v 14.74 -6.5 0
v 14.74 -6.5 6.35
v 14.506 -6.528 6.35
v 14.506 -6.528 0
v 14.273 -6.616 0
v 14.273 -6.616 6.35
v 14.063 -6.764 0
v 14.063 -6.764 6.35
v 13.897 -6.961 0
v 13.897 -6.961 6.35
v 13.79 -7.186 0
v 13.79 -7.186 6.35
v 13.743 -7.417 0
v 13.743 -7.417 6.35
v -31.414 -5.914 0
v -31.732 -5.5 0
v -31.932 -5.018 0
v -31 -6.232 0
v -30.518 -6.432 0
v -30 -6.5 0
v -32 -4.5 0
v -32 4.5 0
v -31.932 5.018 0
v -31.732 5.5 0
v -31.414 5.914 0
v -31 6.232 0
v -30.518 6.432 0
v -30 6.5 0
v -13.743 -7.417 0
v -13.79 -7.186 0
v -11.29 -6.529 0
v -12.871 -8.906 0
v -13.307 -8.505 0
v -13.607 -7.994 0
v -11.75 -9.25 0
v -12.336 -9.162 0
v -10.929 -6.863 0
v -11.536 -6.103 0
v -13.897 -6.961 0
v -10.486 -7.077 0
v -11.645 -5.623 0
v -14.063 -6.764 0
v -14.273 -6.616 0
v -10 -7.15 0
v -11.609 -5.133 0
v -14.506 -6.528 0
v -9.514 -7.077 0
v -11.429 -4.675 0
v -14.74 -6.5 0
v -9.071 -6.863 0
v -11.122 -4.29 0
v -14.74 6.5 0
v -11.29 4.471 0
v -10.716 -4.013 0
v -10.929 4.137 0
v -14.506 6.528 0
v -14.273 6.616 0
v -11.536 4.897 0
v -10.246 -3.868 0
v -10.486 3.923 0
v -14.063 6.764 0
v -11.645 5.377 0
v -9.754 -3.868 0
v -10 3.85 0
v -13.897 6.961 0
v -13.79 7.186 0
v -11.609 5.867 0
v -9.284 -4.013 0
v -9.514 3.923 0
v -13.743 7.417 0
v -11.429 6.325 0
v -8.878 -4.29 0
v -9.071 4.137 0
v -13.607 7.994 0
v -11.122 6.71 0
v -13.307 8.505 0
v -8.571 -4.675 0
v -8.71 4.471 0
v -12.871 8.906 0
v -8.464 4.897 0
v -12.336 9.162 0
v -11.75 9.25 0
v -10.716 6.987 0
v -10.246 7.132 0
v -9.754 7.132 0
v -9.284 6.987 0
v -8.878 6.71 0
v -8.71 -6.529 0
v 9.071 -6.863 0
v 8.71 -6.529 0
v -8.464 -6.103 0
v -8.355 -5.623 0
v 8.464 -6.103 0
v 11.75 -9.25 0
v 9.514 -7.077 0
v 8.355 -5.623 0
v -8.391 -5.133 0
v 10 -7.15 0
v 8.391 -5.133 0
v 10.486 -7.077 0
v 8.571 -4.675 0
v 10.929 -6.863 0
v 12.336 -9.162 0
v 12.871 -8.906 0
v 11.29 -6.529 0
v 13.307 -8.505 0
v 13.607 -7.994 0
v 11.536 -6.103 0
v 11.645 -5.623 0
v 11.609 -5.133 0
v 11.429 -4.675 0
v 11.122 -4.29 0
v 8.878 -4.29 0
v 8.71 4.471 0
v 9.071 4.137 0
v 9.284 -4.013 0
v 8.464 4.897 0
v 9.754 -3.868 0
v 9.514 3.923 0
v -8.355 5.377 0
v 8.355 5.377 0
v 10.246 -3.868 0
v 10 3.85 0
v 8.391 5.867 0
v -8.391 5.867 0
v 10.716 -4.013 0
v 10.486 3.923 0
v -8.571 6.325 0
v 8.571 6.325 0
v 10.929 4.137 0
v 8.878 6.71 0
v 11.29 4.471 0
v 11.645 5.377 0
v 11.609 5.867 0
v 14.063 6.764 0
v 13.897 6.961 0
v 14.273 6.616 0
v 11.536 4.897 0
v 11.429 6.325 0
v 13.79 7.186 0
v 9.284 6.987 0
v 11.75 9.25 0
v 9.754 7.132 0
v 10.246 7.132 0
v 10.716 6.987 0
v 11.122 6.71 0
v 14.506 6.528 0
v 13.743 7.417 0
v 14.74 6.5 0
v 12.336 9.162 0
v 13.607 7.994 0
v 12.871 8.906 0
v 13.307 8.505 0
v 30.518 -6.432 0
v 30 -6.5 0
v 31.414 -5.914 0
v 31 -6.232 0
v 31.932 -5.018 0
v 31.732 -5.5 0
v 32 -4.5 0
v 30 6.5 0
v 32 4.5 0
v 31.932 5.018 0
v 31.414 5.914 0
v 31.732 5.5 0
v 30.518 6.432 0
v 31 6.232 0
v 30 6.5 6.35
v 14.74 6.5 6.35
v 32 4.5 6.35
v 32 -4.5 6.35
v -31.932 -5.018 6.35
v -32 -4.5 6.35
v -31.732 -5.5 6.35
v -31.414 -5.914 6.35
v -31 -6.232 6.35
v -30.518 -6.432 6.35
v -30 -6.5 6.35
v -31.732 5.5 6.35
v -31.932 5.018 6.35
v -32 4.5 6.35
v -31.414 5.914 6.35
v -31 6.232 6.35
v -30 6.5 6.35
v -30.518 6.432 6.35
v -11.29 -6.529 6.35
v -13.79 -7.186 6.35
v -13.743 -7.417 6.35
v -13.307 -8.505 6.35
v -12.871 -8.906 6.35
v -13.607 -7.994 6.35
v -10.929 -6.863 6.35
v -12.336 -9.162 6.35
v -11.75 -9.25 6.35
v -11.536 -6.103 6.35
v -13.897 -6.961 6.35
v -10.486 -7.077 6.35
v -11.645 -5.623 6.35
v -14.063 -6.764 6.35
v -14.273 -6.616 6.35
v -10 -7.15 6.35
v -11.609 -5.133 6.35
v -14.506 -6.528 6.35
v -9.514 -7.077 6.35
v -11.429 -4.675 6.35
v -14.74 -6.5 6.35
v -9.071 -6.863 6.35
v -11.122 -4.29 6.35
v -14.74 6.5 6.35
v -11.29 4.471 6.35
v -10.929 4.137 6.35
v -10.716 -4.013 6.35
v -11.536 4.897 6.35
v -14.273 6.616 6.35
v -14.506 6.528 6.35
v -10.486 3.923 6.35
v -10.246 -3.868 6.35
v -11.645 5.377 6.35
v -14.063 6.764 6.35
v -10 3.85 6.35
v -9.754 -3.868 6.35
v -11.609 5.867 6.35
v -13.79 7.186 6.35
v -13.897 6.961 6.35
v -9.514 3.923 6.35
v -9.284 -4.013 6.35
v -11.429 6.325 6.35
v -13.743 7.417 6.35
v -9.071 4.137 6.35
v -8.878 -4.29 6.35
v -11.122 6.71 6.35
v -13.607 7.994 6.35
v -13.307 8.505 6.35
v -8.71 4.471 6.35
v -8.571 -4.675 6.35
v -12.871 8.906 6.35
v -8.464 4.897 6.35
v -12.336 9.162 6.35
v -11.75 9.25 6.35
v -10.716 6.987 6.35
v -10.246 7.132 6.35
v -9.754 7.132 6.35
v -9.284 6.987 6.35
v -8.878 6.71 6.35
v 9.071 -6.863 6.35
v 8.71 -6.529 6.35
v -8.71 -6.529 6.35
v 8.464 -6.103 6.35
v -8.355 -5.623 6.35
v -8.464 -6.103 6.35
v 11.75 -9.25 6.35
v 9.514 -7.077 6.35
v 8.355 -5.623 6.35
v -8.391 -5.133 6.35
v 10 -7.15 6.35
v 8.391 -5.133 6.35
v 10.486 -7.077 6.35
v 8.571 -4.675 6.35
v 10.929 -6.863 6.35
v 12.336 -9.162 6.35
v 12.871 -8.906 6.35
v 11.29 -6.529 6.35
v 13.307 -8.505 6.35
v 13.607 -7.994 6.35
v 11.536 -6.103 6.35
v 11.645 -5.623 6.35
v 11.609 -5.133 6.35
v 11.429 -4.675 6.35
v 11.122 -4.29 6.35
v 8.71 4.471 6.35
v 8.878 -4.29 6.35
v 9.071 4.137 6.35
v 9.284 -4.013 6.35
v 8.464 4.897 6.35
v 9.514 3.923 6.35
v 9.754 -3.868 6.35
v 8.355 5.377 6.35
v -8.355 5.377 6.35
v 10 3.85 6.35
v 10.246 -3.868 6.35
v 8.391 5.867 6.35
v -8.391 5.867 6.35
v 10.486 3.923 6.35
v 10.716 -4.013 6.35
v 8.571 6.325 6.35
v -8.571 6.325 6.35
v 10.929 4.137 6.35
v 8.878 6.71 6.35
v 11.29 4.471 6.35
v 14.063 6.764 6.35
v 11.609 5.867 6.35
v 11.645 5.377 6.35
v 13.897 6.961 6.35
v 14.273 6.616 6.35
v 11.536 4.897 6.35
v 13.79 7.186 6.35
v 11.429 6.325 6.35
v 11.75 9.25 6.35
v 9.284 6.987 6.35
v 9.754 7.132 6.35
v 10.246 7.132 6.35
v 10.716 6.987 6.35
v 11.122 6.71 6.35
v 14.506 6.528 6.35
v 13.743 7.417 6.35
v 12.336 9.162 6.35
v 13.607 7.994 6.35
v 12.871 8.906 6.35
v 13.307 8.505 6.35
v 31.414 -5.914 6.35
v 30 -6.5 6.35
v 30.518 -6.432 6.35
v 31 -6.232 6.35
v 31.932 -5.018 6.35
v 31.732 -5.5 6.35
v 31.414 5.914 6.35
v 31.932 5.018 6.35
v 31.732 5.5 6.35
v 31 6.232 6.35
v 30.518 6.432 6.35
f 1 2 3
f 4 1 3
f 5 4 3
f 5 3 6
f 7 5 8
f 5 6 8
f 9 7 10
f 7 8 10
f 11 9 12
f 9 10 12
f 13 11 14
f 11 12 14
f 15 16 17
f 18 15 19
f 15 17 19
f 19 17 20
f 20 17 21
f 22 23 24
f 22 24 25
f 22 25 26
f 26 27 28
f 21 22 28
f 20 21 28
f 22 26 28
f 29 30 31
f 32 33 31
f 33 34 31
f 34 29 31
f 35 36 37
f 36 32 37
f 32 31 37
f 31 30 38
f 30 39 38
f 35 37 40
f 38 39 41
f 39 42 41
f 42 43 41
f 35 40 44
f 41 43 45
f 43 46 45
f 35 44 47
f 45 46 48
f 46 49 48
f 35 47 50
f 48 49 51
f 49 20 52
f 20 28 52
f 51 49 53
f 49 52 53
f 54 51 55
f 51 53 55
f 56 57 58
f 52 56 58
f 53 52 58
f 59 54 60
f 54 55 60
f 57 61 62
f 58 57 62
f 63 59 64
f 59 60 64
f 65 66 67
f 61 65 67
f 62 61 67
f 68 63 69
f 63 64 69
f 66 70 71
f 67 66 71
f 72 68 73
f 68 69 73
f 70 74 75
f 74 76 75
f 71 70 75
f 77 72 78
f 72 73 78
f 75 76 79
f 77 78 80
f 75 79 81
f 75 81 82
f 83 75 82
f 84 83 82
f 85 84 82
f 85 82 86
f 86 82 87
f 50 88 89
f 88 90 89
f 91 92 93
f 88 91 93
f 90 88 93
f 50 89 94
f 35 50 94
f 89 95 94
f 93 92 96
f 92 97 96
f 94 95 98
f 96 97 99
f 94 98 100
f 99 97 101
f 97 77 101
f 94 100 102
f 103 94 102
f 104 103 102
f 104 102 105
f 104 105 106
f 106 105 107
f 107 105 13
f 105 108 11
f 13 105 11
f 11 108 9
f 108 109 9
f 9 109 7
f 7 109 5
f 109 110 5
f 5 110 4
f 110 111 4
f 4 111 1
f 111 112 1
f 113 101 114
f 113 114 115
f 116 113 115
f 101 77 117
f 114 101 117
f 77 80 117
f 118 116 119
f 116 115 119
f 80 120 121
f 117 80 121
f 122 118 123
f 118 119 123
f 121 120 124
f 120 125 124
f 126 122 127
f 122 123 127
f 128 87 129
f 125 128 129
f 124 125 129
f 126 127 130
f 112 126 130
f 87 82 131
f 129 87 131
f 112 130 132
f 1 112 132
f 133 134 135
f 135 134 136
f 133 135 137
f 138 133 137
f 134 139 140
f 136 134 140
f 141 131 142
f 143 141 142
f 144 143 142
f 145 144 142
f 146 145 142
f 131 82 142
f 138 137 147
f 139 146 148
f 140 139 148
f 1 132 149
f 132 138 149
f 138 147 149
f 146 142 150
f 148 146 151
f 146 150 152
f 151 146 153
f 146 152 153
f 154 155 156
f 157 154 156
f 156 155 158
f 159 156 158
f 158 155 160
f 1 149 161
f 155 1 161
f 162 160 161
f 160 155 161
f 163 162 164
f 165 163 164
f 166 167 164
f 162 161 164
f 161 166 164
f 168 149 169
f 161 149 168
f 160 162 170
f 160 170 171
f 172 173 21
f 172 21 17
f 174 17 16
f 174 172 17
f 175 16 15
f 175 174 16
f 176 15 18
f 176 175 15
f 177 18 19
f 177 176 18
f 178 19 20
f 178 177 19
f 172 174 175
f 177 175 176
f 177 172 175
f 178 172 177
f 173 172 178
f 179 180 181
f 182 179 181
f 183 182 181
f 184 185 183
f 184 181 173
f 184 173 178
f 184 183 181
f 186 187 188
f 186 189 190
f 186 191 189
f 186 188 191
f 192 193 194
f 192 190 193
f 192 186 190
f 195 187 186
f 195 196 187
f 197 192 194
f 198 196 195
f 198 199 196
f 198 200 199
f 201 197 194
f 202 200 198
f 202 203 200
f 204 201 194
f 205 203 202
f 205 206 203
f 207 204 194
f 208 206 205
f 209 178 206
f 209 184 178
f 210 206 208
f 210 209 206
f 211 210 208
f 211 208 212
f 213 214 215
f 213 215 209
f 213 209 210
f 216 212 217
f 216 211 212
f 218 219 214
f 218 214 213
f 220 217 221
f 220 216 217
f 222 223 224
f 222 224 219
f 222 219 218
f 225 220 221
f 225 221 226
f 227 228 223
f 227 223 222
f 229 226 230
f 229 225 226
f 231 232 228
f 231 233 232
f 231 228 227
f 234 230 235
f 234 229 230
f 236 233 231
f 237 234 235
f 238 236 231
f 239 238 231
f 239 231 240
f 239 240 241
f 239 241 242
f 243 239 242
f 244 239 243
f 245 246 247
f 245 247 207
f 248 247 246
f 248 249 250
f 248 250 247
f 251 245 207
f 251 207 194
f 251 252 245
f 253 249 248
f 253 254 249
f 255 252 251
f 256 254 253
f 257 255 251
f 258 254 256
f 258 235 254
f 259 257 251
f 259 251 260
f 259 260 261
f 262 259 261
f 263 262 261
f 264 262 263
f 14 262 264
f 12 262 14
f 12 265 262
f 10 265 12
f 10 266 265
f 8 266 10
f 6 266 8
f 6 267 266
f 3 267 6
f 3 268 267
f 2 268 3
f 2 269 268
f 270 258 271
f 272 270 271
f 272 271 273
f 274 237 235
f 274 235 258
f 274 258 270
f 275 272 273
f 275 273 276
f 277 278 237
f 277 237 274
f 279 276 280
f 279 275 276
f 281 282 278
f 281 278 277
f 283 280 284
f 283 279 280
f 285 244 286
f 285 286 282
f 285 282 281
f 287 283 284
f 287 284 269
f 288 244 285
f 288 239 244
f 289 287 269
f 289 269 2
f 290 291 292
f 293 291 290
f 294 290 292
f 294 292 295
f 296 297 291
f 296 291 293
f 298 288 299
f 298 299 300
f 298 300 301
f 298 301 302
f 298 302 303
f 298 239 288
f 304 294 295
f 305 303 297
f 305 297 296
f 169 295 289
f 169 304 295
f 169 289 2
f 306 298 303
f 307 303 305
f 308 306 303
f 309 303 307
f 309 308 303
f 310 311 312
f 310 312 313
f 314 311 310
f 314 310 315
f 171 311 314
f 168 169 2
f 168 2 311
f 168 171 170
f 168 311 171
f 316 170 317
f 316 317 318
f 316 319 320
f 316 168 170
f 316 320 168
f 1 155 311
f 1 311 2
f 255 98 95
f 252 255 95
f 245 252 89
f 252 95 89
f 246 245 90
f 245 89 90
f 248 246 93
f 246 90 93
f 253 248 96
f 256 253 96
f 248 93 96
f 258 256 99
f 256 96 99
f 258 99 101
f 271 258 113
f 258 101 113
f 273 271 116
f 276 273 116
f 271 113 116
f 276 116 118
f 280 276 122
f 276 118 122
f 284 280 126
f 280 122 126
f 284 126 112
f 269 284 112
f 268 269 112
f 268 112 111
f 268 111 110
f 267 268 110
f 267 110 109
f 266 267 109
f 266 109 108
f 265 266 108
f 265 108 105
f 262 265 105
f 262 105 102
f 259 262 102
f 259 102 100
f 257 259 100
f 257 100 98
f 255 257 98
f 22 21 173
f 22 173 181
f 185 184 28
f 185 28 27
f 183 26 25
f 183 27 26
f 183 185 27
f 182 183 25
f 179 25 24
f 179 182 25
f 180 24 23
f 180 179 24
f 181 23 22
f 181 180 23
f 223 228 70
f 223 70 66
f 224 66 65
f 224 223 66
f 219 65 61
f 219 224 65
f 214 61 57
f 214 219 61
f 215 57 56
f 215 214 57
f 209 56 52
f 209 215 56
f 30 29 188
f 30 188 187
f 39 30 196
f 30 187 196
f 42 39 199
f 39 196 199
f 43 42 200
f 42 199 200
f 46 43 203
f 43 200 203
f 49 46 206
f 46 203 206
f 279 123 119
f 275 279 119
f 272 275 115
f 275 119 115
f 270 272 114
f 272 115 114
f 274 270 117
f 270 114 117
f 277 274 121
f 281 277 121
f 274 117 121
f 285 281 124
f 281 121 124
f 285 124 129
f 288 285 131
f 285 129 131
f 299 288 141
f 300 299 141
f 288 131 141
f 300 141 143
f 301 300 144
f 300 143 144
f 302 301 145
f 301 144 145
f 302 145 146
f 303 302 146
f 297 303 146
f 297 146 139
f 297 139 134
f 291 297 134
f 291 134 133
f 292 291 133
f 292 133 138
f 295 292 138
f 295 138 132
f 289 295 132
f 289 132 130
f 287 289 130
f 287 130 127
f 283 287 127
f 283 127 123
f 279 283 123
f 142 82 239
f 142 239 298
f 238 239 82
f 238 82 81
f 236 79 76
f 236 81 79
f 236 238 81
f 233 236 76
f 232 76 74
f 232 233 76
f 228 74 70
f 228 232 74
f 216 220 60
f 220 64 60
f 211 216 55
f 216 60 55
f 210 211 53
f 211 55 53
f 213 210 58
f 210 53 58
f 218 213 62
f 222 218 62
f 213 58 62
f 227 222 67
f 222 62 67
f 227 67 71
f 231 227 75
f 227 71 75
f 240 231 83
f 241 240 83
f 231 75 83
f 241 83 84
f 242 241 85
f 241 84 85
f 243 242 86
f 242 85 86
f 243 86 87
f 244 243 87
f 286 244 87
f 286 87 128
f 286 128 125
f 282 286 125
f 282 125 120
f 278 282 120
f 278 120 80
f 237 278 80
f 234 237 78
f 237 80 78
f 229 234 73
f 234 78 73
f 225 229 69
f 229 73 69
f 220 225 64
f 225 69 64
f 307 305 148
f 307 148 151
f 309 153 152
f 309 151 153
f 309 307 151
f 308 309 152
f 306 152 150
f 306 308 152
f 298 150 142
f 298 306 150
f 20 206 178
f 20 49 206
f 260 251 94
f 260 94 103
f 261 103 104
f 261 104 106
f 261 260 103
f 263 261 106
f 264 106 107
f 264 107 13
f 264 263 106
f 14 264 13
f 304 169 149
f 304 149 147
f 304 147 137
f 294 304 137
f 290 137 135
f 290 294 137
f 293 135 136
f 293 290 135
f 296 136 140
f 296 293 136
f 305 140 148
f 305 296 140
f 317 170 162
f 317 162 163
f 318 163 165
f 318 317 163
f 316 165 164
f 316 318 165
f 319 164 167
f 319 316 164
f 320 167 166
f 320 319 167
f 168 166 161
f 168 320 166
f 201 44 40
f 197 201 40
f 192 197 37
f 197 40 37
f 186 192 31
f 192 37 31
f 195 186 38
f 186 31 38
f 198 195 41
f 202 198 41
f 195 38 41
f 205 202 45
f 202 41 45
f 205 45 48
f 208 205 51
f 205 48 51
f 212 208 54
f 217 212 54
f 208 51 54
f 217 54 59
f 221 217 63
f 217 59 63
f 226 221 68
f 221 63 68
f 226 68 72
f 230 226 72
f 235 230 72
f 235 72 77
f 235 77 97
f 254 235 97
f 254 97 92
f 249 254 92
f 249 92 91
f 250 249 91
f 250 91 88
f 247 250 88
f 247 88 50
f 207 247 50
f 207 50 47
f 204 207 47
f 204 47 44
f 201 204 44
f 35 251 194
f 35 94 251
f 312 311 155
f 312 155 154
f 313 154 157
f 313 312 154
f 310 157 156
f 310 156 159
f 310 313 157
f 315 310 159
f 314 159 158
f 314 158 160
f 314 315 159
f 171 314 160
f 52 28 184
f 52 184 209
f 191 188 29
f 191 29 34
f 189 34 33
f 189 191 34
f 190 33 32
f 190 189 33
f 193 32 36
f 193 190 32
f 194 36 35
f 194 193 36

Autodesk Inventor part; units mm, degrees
ref_plane "YZ Plane" through (0, 0, 0) normal (1, 0, 0) x (0, 1, 0)
ref_plane "XZ Plane" through (0, 0, 0) normal (0, 1, 0) x (-1, 0, 0)
ref_plane "XY Plane" through (0, 0, 0) normal (0, 0, 1) x (1, 0, 0)
sketch "Sketch1" plane through (0, 0, 0) normal (0, 0, 1) x (1, 0, 0)
  line L0 (13.75, -9.25) -> (-13.75, -9.25)
  line L1 (-13.75, -9.25) -> (-13.75, 9.25)
  line L2 (-13.75, 9.25) -> (13.75, 9.25)
  line L3 (13.75, 9.25) -> (13.75, -9.25)
  line L4 (13.75, -9.25) -> (-13.75, 9.25) construction
  line L5 (-13.75, -9.25) -> (13.75, 9.25) construction
  line L6 (-18, 0) -> (18, 0) construction
  circle A0 centre (-18, 0) radius 4
  circle A1 centre (18, 0) radius 4
  line L7 (32, -1) -> (-32, -1)
  line L8 (-32, -1) -> (-32, 1)
  line L9 (-32, 1) -> (32, 1)
  line L10 (32, 1) -> (32, -1)
  line L11 (32, -1) -> (-32, 1) construction
  line L12 (-32, -1) -> (32, 1) construction
  line L13 (32, -6.5) -> (-32, -6.5)
  line L14 (-32, -6.5) -> (-32, 6.5)
  line L15 (-32, 6.5) -> (32, 6.5)
  line L16 (32, 6.5) -> (32, -6.5)
  line L17 (32, -6.5) -> (-32, 6.5) construction
  line L18 (-32, -6.5) -> (32, 6.5) construction
  point P0 (0, 0)
  point P1 (-21.873, -1)
  point P2 (-13.75, -6.5)
  point P3 (13.75, -6.5)
  point P4 (21.873, -1)
  point P5 (21.873, 1)
  point P6 (13.75, 6.5)
  point P7 (-13.75, 6.5)
  point P8 (-21.873, 1)
  dimension "d0" = 27.5
  dimension "d1" = 18.5
  dimension "d2" = 8
  dimension "d3" = 8
  dimension "d4" = 36
  dimension "d5" = 64
  dimension "d6" = 2
  dimension "d7" = 13
extrude "Extrusion1" add sketch "Sketch1" along normal blind 6.35
fillet "Fillet1" radius 2 4 edges at (13.75, 9.25, 3.175) (-13.75, 9.25, 3.175) (-13.75, -9.25, 3.175) (13.75, -9.25, 3.175)
fillet "Fillet2" radius 2 4 edges at (-32, 6.5, 3.175) (-32, -6.5, 3.175) (32, 6.5, 3.175) (32, -6.5, 3.175)
fillet "Fillet3" radius 1 4 edges at (-13.75, -6.5, 3.175) (-13.75, 6.5, 3.175) (13.75, 6.5, 3.175) (13.75, -6.5, 3.175)
sketch "Sketch2" plane through (0, 0, 6.35) normal (0, 0, 1) x (1, 0, 0)
  line L0 (10, -5.5) -> (-10, -5.5) construction
  line L1 (-10, -5.5) -> (-10, 5.5) construction
  line L2 (-10, 5.5) -> (10, 5.5) construction
  line L3 (10, 5.5) -> (10, -5.5) construction
  line L4 (10, -5.5) -> (-10, 5.5) construction
  line L5 (-10, -5.5) -> (10, 5.5) construction
  circle A0 centre (-10, 5.5) radius 3 construction
  circle A1 centre (-10, -5.5) radius 3 construction
  circle A2 centre (-10, 5.5) radius 1.65 construction
  line L6 (11.75, 9.25) -> (-11.75, 9.25) construction
  point P0 (0, 0)
  dimension "d13" = 20
  dimension "d14" = 11
  dimension "d22" = 6
  dimension "d23" = 6
  dimension "d25" = 3.3
  dimension "d26" = 2.1
hole "Hole1" at (-10, 5.5, 6.35) at (10, 5.5, 6.35) at (10, -5.5, 6.35) at (-10, -5.5, 6.35) direction (0, 0, -1) diameter 3.3 end through all
properties part number "Printhead Belt Retainer Cap THICK" material "Aluminum 6061"
